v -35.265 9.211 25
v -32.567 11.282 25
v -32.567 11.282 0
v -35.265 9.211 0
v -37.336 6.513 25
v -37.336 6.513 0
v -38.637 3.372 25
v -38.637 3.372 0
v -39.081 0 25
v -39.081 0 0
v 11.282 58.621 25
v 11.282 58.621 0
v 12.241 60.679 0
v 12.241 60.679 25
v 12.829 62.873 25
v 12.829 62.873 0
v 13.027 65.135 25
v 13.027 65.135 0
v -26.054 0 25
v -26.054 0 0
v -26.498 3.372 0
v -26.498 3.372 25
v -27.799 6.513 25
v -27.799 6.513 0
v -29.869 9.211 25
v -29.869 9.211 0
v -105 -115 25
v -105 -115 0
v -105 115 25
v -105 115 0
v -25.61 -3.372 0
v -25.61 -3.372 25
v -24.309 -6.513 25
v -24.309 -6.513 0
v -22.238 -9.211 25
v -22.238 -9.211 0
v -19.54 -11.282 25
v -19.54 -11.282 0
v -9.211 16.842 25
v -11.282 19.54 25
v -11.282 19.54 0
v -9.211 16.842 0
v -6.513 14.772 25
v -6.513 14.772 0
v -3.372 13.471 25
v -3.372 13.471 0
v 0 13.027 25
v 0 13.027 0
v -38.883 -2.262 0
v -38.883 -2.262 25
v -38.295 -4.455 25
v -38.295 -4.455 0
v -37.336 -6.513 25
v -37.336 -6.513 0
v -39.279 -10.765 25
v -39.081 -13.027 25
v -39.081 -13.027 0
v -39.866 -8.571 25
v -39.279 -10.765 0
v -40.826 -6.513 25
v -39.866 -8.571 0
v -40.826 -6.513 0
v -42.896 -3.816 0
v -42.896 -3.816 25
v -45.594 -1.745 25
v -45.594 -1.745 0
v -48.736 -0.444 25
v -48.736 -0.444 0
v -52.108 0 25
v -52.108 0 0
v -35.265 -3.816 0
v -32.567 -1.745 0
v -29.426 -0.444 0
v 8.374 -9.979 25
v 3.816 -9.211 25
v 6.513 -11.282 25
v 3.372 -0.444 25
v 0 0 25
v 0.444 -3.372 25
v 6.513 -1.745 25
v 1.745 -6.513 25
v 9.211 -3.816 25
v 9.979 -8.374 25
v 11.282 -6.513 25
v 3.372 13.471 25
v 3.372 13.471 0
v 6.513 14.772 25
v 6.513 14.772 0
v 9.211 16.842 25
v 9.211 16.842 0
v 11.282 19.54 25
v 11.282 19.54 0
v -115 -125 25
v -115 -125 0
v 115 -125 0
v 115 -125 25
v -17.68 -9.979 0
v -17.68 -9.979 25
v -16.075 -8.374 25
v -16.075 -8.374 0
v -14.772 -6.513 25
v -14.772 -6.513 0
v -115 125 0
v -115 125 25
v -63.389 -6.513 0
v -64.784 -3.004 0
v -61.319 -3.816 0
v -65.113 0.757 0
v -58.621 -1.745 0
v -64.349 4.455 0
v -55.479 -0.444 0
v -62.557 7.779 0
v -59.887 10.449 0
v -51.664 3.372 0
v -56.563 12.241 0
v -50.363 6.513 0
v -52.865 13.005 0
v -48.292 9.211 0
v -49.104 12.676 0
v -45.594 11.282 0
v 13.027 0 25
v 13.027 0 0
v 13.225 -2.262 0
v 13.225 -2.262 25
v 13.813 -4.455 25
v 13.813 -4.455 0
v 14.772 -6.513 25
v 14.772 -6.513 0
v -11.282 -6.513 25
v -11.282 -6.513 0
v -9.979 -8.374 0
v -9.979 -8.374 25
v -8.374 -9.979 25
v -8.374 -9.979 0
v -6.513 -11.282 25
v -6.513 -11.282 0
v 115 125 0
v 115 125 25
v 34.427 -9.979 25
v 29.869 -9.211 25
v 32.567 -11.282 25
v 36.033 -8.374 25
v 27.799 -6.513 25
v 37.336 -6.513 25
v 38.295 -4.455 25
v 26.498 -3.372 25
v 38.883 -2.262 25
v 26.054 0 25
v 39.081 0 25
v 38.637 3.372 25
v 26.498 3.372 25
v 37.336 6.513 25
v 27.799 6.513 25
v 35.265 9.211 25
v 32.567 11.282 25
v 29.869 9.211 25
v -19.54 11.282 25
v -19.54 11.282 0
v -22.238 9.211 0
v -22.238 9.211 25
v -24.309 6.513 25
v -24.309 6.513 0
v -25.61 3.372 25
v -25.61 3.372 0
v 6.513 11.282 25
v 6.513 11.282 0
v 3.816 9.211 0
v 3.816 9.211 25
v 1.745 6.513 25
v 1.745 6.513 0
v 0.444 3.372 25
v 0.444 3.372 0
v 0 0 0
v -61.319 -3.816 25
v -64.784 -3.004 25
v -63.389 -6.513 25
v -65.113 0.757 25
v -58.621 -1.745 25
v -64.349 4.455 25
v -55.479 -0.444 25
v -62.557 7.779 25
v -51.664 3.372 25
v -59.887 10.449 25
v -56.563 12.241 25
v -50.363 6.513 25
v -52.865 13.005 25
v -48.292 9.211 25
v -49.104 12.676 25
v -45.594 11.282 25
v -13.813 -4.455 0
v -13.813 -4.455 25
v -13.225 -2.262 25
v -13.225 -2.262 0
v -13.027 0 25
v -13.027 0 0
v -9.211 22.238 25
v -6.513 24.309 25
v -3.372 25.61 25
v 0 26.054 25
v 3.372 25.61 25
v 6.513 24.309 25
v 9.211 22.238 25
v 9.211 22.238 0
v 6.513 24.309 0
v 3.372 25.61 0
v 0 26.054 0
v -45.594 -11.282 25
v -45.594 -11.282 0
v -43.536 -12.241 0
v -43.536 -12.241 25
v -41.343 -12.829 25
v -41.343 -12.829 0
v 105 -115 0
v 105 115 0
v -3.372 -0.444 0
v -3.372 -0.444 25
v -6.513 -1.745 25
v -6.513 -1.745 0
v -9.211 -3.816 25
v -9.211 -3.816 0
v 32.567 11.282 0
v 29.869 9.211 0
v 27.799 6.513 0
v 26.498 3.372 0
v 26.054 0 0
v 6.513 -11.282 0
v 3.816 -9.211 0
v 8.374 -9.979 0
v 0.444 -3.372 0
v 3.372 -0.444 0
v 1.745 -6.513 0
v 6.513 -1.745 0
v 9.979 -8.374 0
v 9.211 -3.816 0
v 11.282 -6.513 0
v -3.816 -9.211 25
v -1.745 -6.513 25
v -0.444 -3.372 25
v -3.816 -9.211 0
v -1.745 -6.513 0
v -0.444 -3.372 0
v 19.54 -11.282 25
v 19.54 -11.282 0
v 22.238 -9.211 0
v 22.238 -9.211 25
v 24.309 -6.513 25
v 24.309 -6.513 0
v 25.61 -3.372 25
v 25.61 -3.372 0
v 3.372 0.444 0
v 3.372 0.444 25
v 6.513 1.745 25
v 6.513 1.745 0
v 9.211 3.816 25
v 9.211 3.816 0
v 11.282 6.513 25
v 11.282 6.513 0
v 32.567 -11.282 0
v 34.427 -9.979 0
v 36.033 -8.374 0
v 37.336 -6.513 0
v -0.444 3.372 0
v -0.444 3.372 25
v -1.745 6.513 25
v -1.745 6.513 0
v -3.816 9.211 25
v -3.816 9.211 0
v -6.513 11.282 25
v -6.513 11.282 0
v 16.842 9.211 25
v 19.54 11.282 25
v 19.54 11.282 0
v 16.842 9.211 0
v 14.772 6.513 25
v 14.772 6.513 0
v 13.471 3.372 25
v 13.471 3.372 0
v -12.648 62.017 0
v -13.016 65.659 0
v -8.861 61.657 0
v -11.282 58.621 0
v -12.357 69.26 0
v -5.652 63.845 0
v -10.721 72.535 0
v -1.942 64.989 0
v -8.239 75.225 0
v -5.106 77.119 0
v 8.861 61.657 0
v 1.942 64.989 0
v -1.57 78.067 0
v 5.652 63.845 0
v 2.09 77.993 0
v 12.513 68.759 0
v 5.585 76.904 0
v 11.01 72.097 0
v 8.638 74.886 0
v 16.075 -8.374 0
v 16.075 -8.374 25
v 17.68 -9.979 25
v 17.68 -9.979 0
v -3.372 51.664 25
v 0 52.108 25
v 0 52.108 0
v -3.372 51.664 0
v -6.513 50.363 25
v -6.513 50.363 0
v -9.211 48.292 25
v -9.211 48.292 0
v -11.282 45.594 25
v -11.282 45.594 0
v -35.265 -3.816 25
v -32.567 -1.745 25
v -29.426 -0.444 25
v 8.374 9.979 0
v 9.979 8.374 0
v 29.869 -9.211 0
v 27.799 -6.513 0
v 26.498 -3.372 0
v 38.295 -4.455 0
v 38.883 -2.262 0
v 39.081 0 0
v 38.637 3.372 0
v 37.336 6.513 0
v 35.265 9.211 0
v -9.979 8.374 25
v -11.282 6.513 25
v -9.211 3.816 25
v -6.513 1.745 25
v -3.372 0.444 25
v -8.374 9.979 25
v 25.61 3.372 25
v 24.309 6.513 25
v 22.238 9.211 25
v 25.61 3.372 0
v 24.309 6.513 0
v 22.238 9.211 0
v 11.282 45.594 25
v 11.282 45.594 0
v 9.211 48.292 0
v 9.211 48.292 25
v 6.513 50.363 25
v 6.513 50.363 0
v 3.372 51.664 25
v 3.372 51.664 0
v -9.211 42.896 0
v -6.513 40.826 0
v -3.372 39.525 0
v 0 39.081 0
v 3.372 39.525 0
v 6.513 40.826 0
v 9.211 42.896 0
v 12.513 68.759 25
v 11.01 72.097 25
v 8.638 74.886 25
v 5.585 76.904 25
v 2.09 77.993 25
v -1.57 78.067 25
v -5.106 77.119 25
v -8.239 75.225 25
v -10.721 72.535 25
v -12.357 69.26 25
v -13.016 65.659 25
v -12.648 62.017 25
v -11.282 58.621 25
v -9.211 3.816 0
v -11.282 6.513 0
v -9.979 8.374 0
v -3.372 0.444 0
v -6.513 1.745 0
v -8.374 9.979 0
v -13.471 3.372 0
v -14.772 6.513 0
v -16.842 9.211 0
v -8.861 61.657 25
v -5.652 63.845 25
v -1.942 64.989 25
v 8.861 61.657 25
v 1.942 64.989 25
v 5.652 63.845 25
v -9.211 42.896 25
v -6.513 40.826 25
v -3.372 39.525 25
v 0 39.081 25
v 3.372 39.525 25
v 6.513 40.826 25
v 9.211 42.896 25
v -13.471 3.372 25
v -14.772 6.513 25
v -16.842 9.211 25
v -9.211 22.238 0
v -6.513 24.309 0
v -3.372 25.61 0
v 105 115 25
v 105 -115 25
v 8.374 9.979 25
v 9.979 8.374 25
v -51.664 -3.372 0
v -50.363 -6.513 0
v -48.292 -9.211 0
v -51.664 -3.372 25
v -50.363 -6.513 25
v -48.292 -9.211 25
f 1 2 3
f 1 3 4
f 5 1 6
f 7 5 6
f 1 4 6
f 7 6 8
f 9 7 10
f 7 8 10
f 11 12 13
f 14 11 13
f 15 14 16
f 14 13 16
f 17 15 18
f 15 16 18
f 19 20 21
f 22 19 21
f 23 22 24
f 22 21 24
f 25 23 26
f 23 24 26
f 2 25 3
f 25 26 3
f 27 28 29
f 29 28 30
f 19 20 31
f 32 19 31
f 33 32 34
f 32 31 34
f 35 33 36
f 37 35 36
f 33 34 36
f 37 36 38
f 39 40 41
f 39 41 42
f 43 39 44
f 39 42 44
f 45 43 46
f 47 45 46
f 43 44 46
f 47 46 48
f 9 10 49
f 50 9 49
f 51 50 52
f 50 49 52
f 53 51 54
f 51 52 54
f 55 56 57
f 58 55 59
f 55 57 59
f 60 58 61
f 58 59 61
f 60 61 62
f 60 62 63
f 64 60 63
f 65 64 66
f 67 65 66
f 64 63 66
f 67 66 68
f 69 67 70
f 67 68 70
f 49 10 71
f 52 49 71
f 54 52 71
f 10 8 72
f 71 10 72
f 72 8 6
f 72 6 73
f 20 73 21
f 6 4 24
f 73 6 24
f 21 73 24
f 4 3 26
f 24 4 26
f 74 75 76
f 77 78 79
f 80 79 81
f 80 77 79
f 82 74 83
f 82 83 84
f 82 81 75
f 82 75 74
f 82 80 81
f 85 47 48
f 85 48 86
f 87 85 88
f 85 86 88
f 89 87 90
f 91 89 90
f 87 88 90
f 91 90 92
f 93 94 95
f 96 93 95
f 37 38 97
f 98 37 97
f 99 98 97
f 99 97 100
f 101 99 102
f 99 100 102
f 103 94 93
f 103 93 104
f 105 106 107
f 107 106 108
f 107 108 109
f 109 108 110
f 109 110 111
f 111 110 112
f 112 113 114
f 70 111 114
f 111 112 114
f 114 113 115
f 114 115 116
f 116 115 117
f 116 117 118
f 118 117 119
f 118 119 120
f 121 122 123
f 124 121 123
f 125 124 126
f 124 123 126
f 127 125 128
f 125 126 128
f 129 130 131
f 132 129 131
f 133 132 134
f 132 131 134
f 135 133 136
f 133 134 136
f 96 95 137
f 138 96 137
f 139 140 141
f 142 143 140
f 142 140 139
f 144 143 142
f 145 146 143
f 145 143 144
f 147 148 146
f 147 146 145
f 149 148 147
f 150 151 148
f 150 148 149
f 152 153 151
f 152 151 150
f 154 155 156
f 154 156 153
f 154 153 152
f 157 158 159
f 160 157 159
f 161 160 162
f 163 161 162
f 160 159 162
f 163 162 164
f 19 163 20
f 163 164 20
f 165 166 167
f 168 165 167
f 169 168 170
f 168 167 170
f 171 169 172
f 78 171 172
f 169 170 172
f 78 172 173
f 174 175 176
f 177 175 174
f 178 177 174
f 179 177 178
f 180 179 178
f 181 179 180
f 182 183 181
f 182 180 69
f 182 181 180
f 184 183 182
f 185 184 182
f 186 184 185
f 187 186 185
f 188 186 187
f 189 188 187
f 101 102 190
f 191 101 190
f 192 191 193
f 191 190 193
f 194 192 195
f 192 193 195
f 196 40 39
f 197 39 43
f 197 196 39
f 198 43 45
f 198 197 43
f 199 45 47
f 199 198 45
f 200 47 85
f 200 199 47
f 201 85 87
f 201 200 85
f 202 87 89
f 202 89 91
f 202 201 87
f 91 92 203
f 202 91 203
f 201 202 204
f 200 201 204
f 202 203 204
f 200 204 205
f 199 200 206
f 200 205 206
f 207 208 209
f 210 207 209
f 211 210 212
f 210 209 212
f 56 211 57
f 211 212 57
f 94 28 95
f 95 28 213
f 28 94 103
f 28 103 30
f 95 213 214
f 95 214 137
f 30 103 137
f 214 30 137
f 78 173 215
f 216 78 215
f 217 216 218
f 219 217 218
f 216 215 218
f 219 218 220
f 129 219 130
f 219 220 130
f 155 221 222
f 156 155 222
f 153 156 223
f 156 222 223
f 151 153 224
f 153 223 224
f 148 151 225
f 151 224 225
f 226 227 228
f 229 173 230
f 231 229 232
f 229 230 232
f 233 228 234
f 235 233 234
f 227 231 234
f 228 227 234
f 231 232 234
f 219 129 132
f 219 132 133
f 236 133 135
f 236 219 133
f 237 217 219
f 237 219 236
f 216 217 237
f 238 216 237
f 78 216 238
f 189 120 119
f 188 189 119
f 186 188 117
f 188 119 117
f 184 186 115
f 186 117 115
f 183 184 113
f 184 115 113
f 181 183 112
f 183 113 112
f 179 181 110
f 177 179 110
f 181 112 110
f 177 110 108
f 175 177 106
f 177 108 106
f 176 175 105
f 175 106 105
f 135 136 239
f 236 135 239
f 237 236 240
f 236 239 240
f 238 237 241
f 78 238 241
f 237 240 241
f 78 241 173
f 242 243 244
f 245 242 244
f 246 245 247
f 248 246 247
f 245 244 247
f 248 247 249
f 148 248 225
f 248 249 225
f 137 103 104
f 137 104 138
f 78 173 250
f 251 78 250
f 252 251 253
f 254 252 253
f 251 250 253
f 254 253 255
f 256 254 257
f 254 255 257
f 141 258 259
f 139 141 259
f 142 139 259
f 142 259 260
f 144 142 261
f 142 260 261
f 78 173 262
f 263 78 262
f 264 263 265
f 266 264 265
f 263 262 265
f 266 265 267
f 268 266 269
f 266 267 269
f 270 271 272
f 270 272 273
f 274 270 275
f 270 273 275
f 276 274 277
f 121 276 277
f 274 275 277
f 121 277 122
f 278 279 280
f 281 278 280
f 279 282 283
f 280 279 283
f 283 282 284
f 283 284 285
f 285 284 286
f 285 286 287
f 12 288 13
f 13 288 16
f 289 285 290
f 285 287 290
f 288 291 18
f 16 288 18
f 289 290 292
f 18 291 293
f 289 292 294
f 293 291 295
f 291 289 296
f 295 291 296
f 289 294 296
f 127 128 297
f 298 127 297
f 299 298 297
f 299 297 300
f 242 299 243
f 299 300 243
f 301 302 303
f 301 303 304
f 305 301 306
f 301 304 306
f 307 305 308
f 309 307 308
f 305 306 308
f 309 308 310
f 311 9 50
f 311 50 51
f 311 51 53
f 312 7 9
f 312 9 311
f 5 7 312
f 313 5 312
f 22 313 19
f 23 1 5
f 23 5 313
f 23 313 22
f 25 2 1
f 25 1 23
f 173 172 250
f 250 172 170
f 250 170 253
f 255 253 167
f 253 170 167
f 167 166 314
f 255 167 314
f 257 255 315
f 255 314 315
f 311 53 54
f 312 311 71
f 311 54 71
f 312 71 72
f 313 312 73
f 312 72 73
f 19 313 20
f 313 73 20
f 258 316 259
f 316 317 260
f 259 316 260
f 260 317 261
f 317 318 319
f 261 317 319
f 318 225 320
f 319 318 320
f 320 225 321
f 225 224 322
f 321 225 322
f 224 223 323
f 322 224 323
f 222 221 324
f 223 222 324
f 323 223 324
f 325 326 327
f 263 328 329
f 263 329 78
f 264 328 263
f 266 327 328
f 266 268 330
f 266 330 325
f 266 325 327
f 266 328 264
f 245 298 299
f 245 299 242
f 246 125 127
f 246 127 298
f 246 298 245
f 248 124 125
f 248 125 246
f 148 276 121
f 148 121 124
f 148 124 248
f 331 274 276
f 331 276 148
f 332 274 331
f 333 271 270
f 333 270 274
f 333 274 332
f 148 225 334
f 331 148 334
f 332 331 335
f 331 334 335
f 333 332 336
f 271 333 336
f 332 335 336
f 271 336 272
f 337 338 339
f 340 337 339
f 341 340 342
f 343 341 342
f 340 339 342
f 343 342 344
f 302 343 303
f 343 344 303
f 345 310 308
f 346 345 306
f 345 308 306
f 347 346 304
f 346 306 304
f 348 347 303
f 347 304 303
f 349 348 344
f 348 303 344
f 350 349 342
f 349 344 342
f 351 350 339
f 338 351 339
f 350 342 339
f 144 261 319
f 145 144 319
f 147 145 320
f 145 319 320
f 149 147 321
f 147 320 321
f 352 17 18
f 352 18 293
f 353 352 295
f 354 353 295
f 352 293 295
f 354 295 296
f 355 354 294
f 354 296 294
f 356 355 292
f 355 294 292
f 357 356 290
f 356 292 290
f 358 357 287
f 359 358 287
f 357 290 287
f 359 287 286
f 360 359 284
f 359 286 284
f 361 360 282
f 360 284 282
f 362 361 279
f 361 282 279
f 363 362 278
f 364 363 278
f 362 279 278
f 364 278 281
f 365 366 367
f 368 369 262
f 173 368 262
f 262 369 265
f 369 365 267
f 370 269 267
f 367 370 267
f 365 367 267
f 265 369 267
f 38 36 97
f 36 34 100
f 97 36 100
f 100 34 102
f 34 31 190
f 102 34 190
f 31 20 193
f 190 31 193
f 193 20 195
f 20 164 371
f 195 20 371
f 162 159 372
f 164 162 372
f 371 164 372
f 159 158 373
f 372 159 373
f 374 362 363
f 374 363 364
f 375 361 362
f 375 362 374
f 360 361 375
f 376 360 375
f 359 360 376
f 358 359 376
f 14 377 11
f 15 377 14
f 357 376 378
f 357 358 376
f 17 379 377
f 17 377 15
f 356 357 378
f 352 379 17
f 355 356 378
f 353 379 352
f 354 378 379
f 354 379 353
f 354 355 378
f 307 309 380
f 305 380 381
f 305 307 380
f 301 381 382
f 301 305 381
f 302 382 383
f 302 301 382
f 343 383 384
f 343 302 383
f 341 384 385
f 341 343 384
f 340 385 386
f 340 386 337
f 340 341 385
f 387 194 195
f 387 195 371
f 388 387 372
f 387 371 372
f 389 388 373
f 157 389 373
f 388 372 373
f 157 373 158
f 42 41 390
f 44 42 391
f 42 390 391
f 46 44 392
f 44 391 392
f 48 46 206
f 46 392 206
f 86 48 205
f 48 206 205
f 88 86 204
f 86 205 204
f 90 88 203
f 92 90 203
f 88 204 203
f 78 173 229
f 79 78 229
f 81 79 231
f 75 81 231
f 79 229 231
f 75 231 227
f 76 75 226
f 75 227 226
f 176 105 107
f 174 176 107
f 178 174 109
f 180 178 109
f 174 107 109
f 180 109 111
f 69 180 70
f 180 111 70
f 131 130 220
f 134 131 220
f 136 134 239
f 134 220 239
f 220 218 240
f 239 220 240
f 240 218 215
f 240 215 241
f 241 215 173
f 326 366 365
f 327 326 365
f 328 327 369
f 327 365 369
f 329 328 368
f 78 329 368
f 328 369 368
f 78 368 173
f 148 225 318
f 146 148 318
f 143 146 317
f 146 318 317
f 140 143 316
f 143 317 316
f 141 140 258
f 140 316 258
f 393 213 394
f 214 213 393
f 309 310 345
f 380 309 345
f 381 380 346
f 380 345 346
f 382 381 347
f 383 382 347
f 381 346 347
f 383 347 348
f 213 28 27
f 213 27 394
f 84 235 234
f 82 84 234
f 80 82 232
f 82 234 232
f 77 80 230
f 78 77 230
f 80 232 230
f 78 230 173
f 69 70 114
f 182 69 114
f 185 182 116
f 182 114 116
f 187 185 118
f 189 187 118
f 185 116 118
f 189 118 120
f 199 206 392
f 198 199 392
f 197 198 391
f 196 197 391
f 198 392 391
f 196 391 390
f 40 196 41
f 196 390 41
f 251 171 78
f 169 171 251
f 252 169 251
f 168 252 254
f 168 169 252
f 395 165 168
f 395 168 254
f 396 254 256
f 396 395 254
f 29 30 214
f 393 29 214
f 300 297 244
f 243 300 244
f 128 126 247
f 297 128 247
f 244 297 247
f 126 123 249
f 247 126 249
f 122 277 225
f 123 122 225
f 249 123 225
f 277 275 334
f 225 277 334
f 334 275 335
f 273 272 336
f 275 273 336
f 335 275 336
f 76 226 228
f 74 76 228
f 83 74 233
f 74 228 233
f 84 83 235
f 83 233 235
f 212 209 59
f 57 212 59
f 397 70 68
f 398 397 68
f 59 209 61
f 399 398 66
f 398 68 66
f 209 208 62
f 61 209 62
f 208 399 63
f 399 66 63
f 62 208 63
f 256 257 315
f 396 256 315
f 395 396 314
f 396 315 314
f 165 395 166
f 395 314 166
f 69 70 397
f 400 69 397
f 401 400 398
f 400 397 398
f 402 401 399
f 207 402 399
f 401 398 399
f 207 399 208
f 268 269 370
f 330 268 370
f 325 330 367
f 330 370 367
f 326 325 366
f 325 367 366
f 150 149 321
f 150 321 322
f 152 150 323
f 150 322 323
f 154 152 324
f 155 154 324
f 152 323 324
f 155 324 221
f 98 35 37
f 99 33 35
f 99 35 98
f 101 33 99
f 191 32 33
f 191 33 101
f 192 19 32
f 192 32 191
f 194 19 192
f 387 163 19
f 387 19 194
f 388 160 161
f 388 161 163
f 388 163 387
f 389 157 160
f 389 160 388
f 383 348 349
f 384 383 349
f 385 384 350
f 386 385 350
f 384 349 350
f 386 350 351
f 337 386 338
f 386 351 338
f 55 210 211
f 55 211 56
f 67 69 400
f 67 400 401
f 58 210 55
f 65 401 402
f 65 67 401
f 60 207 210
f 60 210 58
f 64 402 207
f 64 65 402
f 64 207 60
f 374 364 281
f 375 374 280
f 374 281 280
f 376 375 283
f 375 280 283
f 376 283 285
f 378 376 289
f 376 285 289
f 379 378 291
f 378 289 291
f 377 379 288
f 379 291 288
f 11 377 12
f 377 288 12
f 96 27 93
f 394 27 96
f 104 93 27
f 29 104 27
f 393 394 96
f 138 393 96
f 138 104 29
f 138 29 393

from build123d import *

# Parameters (mm, degrees)
F0_W     = 230
F0_H     = 250
F0_W_2   = 209.9999934435
F0_H_2   = 229.9999934435
F1_DEPTH = 25
F3_DEPTH = 25


with BuildPart() as f1:
    # F0 (on Top) → F1 (new body)
    with BuildSketch(Plane.XY):
        Rectangle(F0_W, F0_H)
        Rectangle(F0_W_2, F0_H_2, mode=Mode.SUBTRACT)
    extrude(amount=F1_DEPTH)


with BuildPart() as f3:
    # F2 (on Top) → F3 (new body)
    with BuildSketch(Plane.XY):
        with BuildLine():
            ThreePointArc((19.5404246493, 11.2816694314), (14.7722301011, 6.5134748831), (13.0269497662, 0))
            ThreePointArc((13.0269497662, 0), (13.4708323155, -3.3716226991), (14.7722301011, -6.5134748831))
            ThreePointArc((14.7722301011, -6.5134748831), (19.5404246493, -1.7452803349), (26.0538995325, 0))
            ThreePointArc((26.0538995325, 0), (24.3086191976, 6.5134748831), (19.5404246493, 11.2816694314))
        make_face()
        with BuildLine():
            ThreePointArc((26.0538995325, 0), (19.5404246493, -1.7452803349), (14.7722301011, -6.5134748831))
            ThreePointArc((14.7722301011, -6.5134748831), (16.8424550146, -9.2114445179), (19.5404246493, -11.2816694314))
            ThreePointArc((19.5404246493, -11.2816694314), (24.3086191976, -6.5134748831), (26.0538995325, 0))
        make_face()
    extrude(amount=F3_DEPTH)


with BuildPart() as f3b:
    # F2 (on Top) → F3, piece 2 (new body)
    with BuildSketch(Plane.XY):
        with BuildLine():
            ThreePointArc((0, 0), (6.5134748831, 1.7452803349), (11.2816694314, 6.5134748831))
            ThreePointArc((11.2816694314, 6.5134748831), (9.2114445179, 9.2114445179), (6.5134748831, 11.2816694314))
            ThreePointArc((6.5134748831, 11.2816694314), (1.7452803349, 6.5134748831), (0, 0))
        make_face()
    extrude(amount=F3_DEPTH)


with BuildPart() as f3c:
    # F2 (on Top) → F3, piece 3 (new body)
    with BuildSketch(Plane.XY):
        with BuildLine():
            ThreePointArc((6.5134748831, -11.2816694314), (9.2114445179, -9.2114445179), (11.2816694314, -6.5134748831))
            ThreePointArc((11.2816694314, -6.5134748831), (6.5134748831, -1.7452803349), (0, 0))
            ThreePointArc((0, 0), (1.7452803349, -6.5134748831), (6.5134748831, -11.2816694314))
        make_face()
    extrude(amount=F3_DEPTH)


with BuildPart() as f3d:
    # F2 (on Top) → F3, piece 4 (new body)
    with BuildSketch(Plane.XY):
        with BuildLine():
            ThreePointArc((-11.2816694314, 6.5134748831), (-6.5134748831, 1.7452803349), (0, 0))
            ThreePointArc((0, 0), (-1.7452803349, 6.5134748831), (-6.5134748831, 11.2816694314))
            ThreePointArc((-6.5134748831, 11.2816694314), (-9.2114445179, 9.2114445179), (-11.2816694314, 6.5134748831))
        make_face()
    extrude(amount=F3_DEPTH)


with BuildPart() as f3e:
    # F2 (on Top) → F3, piece 5 (new body)
    with BuildSketch(Plane.XY):
        with BuildLine():
            ThreePointArc((-6.5134748831, -11.2816694314), (-1.7452803349, -6.5134748831), (0, 0))
            ThreePointArc((0, 0), (-6.5134748831, -1.7452803349), (-11.2816694314, -6.5134748831))
            ThreePointArc((-11.2816694314, -6.5134748831), (-9.2114445179, -9.2114445179), (-6.5134748831, -11.2816694314))
        make_face()
    extrude(amount=F3_DEPTH)


with BuildPart() as f3f:
    # F2 (on Top) → F3, piece 6 (new body)
    with BuildSketch(Plane.XY):
        with BuildLine():
            ThreePointArc((37.3355689638, -6.5134748831), (32.5673744156, -1.7452803349), (26.0538995325, 0))
            ThreePointArc((26.0538995325, 0), (27.7991798673, -6.5134748831), (32.5673744156, -11.2816694314))
            ThreePointArc((32.5673744156, -11.2816694314), (35.2653440503, -9.2114445179), (37.3355689638, -6.5134748831))
        make_face()
        with BuildLine():
            ThreePointArc((32.5673744156, 11.2816694314), (27.7991798673, 6.5134748831), (26.0538995325, 0))
            ThreePointArc((26.0538995325, 0), (32.5673744156, -1.7452803349), (37.3355689638, -6.5134748831))
            ThreePointArc((37.3355689638, -6.5134748831), (38.6369667494, -3.3716226991), (39.0808492987, 0))
            ThreePointArc((39.0808492987, 0), (37.3355689638, 6.5134748831), (32.5673744156, 11.2816694314))
        make_face()
    extrude(amount=F3_DEPTH)


with BuildPart() as f3g:
    # F2 (on Top) → F3, piece 7 (new body)
    with BuildSketch(Plane.XY):
        with BuildLine():
            ThreePointArc((-11.2816694314, 19.5404246493), (-6.5134748831, 14.7722301011), (0, 13.0269497662))
            ThreePointArc((0, 13.0269497662), (6.5134748831, 14.7722301011), (11.2816694314, 19.5404246493))
            ThreePointArc((11.2816694314, 19.5404246493), (6.5134748329, 24.3086192266), (-1.16e-07, 26.0538995325))
            ThreePointArc((-1.16e-07, 26.0538995325), (-6.5134749333, 24.3086191686), (-11.2816694314, 19.5404246493))
        make_face()
    extrude(amount=F3_DEPTH)


with BuildPart() as f3h:
    # F2 (on Top) → F3, piece 8 (new body)
    with BuildSketch(Plane.XY):
        with BuildLine():
            ThreePointArc((-14.7722301011, -6.5134748831), (-13.4708323155, -3.3716226991), (-13.0269497662, 0))
            ThreePointArc((-13.0269497662, 0), (-14.7722301011, 6.5134748831), (-19.5404246493, 11.2816694314))
            ThreePointArc((-19.5404246493, 11.2816694314), (-24.3086191976, 6.5134748831), (-26.0538995325, 0))
            ThreePointArc((-26.0538995325, 0), (-19.5404246493, -1.7452803349), (-14.7722301011, -6.5134748831))
        make_face()
        with BuildLine():
            ThreePointArc((-26.0538995325, 0), (-24.3086191976, -6.5134748831), (-19.5404246493, -11.2816694314))
            ThreePointArc((-19.5404246493, -11.2816694314), (-16.8424550146, -9.2114445179), (-14.7722301011, -6.5134748831))
            ThreePointArc((-14.7722301011, -6.5134748831), (-19.5404246493, -1.7452803349), (-26.0538995325, 0))
        make_face()
    extrude(amount=F3_DEPTH)


with BuildPart() as f3i:
    # F2 (on Top) → F3, piece 9 (new body)
    with BuildSketch(Plane.XY):
        with BuildLine():
            ThreePointArc((-45.5943241818, -11.2816694314), (-42.4524719978, -12.583067217), (-39.0808492987, -13.0269497662))
            ThreePointArc((-39.0808492987, -13.0269497662), (-39.5247318479, -9.6553270671), (-40.8261296335, -6.5134748831))
            ThreePointArc((-40.8261296335, -6.5134748831), (-42.896354547, -9.2114445179), (-45.5943241818, -11.2816694314))
        make_face()
        with BuildLine():
            ThreePointArc((-52.1077990649, 0), (-50.3625187301, -6.5134748831), (-45.5943241818, -11.2816694314))
            ThreePointArc((-45.5943241818, -11.2816694314), (-42.896354547, -9.2114445179), (-40.8261296335, -6.5134748831))
            ThreePointArc((-40.8261296335, -6.5134748831), (-45.5943241818, -1.7452803349), (-52.1077990649, 0))
        make_face()
    extrude(amount=F3_DEPTH)


with BuildPart() as f3j:
    # F2 (on Top) → F3, piece 10 (new body)
    with BuildSketch(Plane.XY):
        with BuildLine():
            ThreePointArc((-37.3355689638, -6.5134748831), (-32.5673744156, -1.7452803349), (-26.0538995325, 0))
            ThreePointArc((-26.0538995325, 0), (-27.7991798673, 6.5134748831), (-32.5673744156, 11.2816694314))
            ThreePointArc((-32.5673744156, 11.2816694314), (-37.3355689638, 6.5134748831), (-39.0808492987, 0))
            ThreePointArc((-39.0808492987, 0), (-38.6369667494, -3.3716226991), (-37.3355689638, -6.5134748831))
        make_face()
    extrude(amount=F3_DEPTH)


with BuildPart() as f3k:
    # F2 (on Top) → F3, piece 11 (new body)
    with BuildSketch(Plane.XY):
        with BuildLine():
            ThreePointArc((-45.5943241818, 11.2816694314), (-61.3192435828, 9.2114445179), (-63.3894684963, -6.5134748831))
            ThreePointArc((-63.3894684963, -6.5134748831), (-58.621273948, -1.7452803349), (-52.1077990649, 0))
            ThreePointArc((-52.1077990649, 0), (-50.3625187301, 6.5134748831), (-45.5943241818, 11.2816694314))
        make_face()
    extrude(amount=F3_DEPTH)


with BuildPart() as f3l:
    # F2 (on Top) → F3, piece 12 (new body)
    with BuildSketch(Plane.XY):
        with BuildLine():
            ThreePointArc((-11.2816694314, 45.5943241818), (-6.513474888, 40.8261296364), (-1.14e-08, 39.0808492987))
            ThreePointArc((-1.14e-08, 39.0808492987), (6.5134748782, 40.8261296307), (11.2816694314, 45.5943241818))
            ThreePointArc((11.2816694314, 45.5943241818), (6.5134748436, 50.3625187529), (-9.13e-08, 52.1077990649))
            ThreePointArc((-9.13e-08, 52.1077990649), (-6.5134749226, 50.3625187072), (-11.2816694314, 45.5943241818))
        make_face()
    extrude(amount=F3_DEPTH)


with BuildPart() as f3m:
    # F2 (on Top) → F3, piece 13 (new body)
    with BuildSketch(Plane.XY):
        with BuildLine():
            ThreePointArc((13.0269497662, 65.1347488311), (-3.3716226991, 77.7178160481), (-11.2816694314, 58.621273948))
            ThreePointArc((-11.2816694314, 58.621273948), (0, 65.1347488311), (11.2816694314, 58.621273948))
            ThreePointArc((11.2816694314, 58.621273948), (12.583067217, 61.763126132), (13.0269497662, 65.1347488311))
        make_face()
    extrude(amount=F3_DEPTH)


solid = Compound([f1.part, f3.part, f3b.part, f3c.part, f3d.part, f3e.part, f3f.part, f3g.part, f3h.part, f3i.part, f3j.part, f3k.part, f3l.part, f3m.part])
